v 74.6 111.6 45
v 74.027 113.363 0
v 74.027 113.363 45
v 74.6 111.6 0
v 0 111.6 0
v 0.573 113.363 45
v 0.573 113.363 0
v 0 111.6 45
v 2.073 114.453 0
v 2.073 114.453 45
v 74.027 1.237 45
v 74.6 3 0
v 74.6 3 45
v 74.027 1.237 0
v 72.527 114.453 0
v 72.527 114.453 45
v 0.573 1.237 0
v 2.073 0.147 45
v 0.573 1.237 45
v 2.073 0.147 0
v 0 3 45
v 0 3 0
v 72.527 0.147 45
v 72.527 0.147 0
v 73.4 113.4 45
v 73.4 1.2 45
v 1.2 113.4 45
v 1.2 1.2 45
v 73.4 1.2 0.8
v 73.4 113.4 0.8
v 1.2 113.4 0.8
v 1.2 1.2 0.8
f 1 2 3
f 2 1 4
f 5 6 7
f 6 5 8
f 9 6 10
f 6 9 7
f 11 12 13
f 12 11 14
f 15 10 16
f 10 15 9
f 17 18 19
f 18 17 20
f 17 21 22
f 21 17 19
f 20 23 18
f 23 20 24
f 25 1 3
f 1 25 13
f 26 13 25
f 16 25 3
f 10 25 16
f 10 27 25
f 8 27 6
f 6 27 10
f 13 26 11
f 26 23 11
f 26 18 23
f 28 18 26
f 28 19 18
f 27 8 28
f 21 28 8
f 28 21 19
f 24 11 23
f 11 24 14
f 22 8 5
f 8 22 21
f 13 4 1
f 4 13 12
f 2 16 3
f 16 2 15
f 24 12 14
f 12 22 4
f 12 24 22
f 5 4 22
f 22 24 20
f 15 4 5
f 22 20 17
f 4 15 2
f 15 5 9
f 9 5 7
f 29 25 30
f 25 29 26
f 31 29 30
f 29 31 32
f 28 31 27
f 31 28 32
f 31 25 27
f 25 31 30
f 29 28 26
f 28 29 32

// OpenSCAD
// Simple Insert Box for Drawer Container
// All dimensions in mm, based on multiples of 8mm

/* [Printer Settings] */
// Nozzle diameter in mm
nozzle_diameter = 0.6; // [0.2, 0.4, 0.6, 0.8]

/* [Container Dimensions] */
// Width of outer container in grid units (1 unit = 8mm)
outer_width_units = 10; // [1:50]

// Depth of outer container in grid units (1 unit = 8mm)
outer_depth_units = 15; // [1:50]

// Height of outer container in grid units (1 unit = 8mm)
outer_height_units = 6; // [1:20]

// Wall thickness of outer container in mm
outer_wall_thickness = 2.4; // [1.6:0.8:4.0]

// Floor thickness of outer container in mm
outer_floor_thickness = 2.4; // [1.6:0.8:4.0]

/* [Insert Box Dimensions] */
// Wall thickness of insert in mm
insert_wall_thickness = 1.2; // [0.8:0.4:2.4]

// Floor thickness of insert in mm
insert_floor_thickness = 0.8; // [0.4:0.4:2.4]

// Corner radius in mm
corner_radius = 3; // [0:1:8]

// Calculate tolerance based on nozzle diameter
calculated_tolerance = nozzle_diameter / 2;

// Allow manual override of the calculated tolerance
manual_tolerance_override = false; // [true, false]

// Manual tolerance setting (only used if override is enabled)
manual_tolerance = 0.2; // [0:0.05:1]

// Final tolerance value to use
tolerance = manual_tolerance_override ? manual_tolerance : calculated_tolerance;

// Calculate actual dimensions of outer container
outer_width = outer_width_units * 8;
outer_depth = outer_depth_units * 8;
outer_height = outer_height_units * 8;

// Calculate inner dimensions of outer container (where our insert will fit)
outer_inner_width = outer_width - (2 * outer_wall_thickness);
outer_inner_depth = outer_depth - (2 * outer_wall_thickness);
outer_inner_height = outer_height - outer_floor_thickness;

// Calculate max dimensions for the insert (accounting for tolerance)
insert_max_width = outer_inner_width - (2 * tolerance);
insert_max_depth = outer_inner_depth - (2 * tolerance);
insert_max_height = outer_inner_height - (2 * tolerance);

// Calculate inner dimensions of insert
insert_inner_width = insert_max_width - (2 * insert_wall_thickness);
insert_inner_depth = insert_max_depth - (2 * insert_wall_thickness);
insert_inner_height = insert_max_height - insert_floor_thickness;

// Display dimensions and tolerance information
echo("Using nozzle diameter: ", nozzle_diameter);
echo("Calculated tolerance: ", calculated_tolerance);
echo("Final tolerance used: ", tolerance);
echo("Insert max dimensions (w×d×h): ", insert_max_width, "×", insert_max_depth, "×", insert_max_height);
echo("Insert inner dimensions (w×d×h): ", insert_inner_width, "×", insert_inner_depth, "×", insert_inner_height);

// Create insert box
module insert_box() {
    difference() {
        // Outer shape of insert - with flat top
        hull() {
            // Bottom corners
            for (x = [corner_radius, insert_max_width - corner_radius]) {
                for (y = [corner_radius, insert_max_depth - corner_radius]) {
                    translate([x, y, 0])
                    cylinder(h = 0.01, r = corner_radius);
                }
            }
            
            // Top edges - using cylinders for rounded vertical edges, but flat top
            for (x = [corner_radius, insert_max_width - corner_radius]) {
                for (y = [corner_radius, insert_max_depth - corner_radius]) {
                    translate([x, y, insert_max_height - corner_radius])
                    cylinder(h = corner_radius, r = corner_radius);
                }
            }
        }
        
        // Inner cutout
        translate([insert_wall_thickness, insert_wall_thickness, insert_floor_thickness])
        cube([insert_inner_width, insert_inner_depth, insert_inner_height + 1]);
    }
}

// Create the insert box
insert_box();
